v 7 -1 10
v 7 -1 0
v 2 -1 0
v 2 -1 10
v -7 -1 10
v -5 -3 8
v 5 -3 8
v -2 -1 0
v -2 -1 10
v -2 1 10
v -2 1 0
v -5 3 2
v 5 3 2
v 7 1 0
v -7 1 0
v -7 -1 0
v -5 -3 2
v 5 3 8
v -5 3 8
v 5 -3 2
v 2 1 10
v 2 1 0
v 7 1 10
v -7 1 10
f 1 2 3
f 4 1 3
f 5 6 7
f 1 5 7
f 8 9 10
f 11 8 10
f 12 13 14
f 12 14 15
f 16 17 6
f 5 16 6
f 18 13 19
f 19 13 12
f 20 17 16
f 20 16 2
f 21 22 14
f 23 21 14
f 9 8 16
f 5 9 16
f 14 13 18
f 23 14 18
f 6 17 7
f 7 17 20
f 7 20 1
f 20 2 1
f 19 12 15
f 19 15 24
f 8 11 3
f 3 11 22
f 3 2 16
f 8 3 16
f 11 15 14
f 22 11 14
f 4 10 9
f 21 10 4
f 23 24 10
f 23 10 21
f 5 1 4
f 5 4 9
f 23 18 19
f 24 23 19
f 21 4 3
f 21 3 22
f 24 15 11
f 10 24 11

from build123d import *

# Parameters (mm, degrees)
F0_W     = 4
F0_H     = 2
F1_DEPTH = 10
F2_SIZE  = 1.99999
F3_SIZE  = 1.99999


# Not quite as in the source:
# - a fillet or chamfer is up to 0.001 mm smaller than in the source, because OpenCascade refuses the exact size


with BuildPart() as f1:
    # F0 (on Top) → F1 (new body)
    with BuildSketch(Plane.XY):
        Polygon((-7, 3), (-7, 1), (-2, 1), (2, 1), (7, 1), (7, 3), align=None)
        Rectangle(F0_W, F0_H)
        Polygon((-2, -1), (-7, -1), (-7, -3), (7, -3), (7, -1), (2, -1), align=None)
    extrude(amount=F1_DEPTH)

    # F2 (size 2 in the source; OpenCascade refuses exactly that, so slightly less here)
    f2_edges = [f1.edges().sort_by_distance(p)[0] for p in [
        (-7, 3, 5),
        (7, 3, 5),
        (7, -3, 5),
        (-7, -3, 5),
    ]]
    chamfer(f2_edges, length=F2_SIZE)

    # F3 (size 2 in the source; OpenCascade refuses exactly that, so slightly less here)
    f3_edges = [f1.edges().sort_by_distance(p)[0] for p in [
        (0, 3, 10),
        (0, -3, 10),
        (0, -3, 0),
        (0, 3, 0),
    ]]
    chamfer(f3_edges, length=F3_SIZE)


solid = f1.part
